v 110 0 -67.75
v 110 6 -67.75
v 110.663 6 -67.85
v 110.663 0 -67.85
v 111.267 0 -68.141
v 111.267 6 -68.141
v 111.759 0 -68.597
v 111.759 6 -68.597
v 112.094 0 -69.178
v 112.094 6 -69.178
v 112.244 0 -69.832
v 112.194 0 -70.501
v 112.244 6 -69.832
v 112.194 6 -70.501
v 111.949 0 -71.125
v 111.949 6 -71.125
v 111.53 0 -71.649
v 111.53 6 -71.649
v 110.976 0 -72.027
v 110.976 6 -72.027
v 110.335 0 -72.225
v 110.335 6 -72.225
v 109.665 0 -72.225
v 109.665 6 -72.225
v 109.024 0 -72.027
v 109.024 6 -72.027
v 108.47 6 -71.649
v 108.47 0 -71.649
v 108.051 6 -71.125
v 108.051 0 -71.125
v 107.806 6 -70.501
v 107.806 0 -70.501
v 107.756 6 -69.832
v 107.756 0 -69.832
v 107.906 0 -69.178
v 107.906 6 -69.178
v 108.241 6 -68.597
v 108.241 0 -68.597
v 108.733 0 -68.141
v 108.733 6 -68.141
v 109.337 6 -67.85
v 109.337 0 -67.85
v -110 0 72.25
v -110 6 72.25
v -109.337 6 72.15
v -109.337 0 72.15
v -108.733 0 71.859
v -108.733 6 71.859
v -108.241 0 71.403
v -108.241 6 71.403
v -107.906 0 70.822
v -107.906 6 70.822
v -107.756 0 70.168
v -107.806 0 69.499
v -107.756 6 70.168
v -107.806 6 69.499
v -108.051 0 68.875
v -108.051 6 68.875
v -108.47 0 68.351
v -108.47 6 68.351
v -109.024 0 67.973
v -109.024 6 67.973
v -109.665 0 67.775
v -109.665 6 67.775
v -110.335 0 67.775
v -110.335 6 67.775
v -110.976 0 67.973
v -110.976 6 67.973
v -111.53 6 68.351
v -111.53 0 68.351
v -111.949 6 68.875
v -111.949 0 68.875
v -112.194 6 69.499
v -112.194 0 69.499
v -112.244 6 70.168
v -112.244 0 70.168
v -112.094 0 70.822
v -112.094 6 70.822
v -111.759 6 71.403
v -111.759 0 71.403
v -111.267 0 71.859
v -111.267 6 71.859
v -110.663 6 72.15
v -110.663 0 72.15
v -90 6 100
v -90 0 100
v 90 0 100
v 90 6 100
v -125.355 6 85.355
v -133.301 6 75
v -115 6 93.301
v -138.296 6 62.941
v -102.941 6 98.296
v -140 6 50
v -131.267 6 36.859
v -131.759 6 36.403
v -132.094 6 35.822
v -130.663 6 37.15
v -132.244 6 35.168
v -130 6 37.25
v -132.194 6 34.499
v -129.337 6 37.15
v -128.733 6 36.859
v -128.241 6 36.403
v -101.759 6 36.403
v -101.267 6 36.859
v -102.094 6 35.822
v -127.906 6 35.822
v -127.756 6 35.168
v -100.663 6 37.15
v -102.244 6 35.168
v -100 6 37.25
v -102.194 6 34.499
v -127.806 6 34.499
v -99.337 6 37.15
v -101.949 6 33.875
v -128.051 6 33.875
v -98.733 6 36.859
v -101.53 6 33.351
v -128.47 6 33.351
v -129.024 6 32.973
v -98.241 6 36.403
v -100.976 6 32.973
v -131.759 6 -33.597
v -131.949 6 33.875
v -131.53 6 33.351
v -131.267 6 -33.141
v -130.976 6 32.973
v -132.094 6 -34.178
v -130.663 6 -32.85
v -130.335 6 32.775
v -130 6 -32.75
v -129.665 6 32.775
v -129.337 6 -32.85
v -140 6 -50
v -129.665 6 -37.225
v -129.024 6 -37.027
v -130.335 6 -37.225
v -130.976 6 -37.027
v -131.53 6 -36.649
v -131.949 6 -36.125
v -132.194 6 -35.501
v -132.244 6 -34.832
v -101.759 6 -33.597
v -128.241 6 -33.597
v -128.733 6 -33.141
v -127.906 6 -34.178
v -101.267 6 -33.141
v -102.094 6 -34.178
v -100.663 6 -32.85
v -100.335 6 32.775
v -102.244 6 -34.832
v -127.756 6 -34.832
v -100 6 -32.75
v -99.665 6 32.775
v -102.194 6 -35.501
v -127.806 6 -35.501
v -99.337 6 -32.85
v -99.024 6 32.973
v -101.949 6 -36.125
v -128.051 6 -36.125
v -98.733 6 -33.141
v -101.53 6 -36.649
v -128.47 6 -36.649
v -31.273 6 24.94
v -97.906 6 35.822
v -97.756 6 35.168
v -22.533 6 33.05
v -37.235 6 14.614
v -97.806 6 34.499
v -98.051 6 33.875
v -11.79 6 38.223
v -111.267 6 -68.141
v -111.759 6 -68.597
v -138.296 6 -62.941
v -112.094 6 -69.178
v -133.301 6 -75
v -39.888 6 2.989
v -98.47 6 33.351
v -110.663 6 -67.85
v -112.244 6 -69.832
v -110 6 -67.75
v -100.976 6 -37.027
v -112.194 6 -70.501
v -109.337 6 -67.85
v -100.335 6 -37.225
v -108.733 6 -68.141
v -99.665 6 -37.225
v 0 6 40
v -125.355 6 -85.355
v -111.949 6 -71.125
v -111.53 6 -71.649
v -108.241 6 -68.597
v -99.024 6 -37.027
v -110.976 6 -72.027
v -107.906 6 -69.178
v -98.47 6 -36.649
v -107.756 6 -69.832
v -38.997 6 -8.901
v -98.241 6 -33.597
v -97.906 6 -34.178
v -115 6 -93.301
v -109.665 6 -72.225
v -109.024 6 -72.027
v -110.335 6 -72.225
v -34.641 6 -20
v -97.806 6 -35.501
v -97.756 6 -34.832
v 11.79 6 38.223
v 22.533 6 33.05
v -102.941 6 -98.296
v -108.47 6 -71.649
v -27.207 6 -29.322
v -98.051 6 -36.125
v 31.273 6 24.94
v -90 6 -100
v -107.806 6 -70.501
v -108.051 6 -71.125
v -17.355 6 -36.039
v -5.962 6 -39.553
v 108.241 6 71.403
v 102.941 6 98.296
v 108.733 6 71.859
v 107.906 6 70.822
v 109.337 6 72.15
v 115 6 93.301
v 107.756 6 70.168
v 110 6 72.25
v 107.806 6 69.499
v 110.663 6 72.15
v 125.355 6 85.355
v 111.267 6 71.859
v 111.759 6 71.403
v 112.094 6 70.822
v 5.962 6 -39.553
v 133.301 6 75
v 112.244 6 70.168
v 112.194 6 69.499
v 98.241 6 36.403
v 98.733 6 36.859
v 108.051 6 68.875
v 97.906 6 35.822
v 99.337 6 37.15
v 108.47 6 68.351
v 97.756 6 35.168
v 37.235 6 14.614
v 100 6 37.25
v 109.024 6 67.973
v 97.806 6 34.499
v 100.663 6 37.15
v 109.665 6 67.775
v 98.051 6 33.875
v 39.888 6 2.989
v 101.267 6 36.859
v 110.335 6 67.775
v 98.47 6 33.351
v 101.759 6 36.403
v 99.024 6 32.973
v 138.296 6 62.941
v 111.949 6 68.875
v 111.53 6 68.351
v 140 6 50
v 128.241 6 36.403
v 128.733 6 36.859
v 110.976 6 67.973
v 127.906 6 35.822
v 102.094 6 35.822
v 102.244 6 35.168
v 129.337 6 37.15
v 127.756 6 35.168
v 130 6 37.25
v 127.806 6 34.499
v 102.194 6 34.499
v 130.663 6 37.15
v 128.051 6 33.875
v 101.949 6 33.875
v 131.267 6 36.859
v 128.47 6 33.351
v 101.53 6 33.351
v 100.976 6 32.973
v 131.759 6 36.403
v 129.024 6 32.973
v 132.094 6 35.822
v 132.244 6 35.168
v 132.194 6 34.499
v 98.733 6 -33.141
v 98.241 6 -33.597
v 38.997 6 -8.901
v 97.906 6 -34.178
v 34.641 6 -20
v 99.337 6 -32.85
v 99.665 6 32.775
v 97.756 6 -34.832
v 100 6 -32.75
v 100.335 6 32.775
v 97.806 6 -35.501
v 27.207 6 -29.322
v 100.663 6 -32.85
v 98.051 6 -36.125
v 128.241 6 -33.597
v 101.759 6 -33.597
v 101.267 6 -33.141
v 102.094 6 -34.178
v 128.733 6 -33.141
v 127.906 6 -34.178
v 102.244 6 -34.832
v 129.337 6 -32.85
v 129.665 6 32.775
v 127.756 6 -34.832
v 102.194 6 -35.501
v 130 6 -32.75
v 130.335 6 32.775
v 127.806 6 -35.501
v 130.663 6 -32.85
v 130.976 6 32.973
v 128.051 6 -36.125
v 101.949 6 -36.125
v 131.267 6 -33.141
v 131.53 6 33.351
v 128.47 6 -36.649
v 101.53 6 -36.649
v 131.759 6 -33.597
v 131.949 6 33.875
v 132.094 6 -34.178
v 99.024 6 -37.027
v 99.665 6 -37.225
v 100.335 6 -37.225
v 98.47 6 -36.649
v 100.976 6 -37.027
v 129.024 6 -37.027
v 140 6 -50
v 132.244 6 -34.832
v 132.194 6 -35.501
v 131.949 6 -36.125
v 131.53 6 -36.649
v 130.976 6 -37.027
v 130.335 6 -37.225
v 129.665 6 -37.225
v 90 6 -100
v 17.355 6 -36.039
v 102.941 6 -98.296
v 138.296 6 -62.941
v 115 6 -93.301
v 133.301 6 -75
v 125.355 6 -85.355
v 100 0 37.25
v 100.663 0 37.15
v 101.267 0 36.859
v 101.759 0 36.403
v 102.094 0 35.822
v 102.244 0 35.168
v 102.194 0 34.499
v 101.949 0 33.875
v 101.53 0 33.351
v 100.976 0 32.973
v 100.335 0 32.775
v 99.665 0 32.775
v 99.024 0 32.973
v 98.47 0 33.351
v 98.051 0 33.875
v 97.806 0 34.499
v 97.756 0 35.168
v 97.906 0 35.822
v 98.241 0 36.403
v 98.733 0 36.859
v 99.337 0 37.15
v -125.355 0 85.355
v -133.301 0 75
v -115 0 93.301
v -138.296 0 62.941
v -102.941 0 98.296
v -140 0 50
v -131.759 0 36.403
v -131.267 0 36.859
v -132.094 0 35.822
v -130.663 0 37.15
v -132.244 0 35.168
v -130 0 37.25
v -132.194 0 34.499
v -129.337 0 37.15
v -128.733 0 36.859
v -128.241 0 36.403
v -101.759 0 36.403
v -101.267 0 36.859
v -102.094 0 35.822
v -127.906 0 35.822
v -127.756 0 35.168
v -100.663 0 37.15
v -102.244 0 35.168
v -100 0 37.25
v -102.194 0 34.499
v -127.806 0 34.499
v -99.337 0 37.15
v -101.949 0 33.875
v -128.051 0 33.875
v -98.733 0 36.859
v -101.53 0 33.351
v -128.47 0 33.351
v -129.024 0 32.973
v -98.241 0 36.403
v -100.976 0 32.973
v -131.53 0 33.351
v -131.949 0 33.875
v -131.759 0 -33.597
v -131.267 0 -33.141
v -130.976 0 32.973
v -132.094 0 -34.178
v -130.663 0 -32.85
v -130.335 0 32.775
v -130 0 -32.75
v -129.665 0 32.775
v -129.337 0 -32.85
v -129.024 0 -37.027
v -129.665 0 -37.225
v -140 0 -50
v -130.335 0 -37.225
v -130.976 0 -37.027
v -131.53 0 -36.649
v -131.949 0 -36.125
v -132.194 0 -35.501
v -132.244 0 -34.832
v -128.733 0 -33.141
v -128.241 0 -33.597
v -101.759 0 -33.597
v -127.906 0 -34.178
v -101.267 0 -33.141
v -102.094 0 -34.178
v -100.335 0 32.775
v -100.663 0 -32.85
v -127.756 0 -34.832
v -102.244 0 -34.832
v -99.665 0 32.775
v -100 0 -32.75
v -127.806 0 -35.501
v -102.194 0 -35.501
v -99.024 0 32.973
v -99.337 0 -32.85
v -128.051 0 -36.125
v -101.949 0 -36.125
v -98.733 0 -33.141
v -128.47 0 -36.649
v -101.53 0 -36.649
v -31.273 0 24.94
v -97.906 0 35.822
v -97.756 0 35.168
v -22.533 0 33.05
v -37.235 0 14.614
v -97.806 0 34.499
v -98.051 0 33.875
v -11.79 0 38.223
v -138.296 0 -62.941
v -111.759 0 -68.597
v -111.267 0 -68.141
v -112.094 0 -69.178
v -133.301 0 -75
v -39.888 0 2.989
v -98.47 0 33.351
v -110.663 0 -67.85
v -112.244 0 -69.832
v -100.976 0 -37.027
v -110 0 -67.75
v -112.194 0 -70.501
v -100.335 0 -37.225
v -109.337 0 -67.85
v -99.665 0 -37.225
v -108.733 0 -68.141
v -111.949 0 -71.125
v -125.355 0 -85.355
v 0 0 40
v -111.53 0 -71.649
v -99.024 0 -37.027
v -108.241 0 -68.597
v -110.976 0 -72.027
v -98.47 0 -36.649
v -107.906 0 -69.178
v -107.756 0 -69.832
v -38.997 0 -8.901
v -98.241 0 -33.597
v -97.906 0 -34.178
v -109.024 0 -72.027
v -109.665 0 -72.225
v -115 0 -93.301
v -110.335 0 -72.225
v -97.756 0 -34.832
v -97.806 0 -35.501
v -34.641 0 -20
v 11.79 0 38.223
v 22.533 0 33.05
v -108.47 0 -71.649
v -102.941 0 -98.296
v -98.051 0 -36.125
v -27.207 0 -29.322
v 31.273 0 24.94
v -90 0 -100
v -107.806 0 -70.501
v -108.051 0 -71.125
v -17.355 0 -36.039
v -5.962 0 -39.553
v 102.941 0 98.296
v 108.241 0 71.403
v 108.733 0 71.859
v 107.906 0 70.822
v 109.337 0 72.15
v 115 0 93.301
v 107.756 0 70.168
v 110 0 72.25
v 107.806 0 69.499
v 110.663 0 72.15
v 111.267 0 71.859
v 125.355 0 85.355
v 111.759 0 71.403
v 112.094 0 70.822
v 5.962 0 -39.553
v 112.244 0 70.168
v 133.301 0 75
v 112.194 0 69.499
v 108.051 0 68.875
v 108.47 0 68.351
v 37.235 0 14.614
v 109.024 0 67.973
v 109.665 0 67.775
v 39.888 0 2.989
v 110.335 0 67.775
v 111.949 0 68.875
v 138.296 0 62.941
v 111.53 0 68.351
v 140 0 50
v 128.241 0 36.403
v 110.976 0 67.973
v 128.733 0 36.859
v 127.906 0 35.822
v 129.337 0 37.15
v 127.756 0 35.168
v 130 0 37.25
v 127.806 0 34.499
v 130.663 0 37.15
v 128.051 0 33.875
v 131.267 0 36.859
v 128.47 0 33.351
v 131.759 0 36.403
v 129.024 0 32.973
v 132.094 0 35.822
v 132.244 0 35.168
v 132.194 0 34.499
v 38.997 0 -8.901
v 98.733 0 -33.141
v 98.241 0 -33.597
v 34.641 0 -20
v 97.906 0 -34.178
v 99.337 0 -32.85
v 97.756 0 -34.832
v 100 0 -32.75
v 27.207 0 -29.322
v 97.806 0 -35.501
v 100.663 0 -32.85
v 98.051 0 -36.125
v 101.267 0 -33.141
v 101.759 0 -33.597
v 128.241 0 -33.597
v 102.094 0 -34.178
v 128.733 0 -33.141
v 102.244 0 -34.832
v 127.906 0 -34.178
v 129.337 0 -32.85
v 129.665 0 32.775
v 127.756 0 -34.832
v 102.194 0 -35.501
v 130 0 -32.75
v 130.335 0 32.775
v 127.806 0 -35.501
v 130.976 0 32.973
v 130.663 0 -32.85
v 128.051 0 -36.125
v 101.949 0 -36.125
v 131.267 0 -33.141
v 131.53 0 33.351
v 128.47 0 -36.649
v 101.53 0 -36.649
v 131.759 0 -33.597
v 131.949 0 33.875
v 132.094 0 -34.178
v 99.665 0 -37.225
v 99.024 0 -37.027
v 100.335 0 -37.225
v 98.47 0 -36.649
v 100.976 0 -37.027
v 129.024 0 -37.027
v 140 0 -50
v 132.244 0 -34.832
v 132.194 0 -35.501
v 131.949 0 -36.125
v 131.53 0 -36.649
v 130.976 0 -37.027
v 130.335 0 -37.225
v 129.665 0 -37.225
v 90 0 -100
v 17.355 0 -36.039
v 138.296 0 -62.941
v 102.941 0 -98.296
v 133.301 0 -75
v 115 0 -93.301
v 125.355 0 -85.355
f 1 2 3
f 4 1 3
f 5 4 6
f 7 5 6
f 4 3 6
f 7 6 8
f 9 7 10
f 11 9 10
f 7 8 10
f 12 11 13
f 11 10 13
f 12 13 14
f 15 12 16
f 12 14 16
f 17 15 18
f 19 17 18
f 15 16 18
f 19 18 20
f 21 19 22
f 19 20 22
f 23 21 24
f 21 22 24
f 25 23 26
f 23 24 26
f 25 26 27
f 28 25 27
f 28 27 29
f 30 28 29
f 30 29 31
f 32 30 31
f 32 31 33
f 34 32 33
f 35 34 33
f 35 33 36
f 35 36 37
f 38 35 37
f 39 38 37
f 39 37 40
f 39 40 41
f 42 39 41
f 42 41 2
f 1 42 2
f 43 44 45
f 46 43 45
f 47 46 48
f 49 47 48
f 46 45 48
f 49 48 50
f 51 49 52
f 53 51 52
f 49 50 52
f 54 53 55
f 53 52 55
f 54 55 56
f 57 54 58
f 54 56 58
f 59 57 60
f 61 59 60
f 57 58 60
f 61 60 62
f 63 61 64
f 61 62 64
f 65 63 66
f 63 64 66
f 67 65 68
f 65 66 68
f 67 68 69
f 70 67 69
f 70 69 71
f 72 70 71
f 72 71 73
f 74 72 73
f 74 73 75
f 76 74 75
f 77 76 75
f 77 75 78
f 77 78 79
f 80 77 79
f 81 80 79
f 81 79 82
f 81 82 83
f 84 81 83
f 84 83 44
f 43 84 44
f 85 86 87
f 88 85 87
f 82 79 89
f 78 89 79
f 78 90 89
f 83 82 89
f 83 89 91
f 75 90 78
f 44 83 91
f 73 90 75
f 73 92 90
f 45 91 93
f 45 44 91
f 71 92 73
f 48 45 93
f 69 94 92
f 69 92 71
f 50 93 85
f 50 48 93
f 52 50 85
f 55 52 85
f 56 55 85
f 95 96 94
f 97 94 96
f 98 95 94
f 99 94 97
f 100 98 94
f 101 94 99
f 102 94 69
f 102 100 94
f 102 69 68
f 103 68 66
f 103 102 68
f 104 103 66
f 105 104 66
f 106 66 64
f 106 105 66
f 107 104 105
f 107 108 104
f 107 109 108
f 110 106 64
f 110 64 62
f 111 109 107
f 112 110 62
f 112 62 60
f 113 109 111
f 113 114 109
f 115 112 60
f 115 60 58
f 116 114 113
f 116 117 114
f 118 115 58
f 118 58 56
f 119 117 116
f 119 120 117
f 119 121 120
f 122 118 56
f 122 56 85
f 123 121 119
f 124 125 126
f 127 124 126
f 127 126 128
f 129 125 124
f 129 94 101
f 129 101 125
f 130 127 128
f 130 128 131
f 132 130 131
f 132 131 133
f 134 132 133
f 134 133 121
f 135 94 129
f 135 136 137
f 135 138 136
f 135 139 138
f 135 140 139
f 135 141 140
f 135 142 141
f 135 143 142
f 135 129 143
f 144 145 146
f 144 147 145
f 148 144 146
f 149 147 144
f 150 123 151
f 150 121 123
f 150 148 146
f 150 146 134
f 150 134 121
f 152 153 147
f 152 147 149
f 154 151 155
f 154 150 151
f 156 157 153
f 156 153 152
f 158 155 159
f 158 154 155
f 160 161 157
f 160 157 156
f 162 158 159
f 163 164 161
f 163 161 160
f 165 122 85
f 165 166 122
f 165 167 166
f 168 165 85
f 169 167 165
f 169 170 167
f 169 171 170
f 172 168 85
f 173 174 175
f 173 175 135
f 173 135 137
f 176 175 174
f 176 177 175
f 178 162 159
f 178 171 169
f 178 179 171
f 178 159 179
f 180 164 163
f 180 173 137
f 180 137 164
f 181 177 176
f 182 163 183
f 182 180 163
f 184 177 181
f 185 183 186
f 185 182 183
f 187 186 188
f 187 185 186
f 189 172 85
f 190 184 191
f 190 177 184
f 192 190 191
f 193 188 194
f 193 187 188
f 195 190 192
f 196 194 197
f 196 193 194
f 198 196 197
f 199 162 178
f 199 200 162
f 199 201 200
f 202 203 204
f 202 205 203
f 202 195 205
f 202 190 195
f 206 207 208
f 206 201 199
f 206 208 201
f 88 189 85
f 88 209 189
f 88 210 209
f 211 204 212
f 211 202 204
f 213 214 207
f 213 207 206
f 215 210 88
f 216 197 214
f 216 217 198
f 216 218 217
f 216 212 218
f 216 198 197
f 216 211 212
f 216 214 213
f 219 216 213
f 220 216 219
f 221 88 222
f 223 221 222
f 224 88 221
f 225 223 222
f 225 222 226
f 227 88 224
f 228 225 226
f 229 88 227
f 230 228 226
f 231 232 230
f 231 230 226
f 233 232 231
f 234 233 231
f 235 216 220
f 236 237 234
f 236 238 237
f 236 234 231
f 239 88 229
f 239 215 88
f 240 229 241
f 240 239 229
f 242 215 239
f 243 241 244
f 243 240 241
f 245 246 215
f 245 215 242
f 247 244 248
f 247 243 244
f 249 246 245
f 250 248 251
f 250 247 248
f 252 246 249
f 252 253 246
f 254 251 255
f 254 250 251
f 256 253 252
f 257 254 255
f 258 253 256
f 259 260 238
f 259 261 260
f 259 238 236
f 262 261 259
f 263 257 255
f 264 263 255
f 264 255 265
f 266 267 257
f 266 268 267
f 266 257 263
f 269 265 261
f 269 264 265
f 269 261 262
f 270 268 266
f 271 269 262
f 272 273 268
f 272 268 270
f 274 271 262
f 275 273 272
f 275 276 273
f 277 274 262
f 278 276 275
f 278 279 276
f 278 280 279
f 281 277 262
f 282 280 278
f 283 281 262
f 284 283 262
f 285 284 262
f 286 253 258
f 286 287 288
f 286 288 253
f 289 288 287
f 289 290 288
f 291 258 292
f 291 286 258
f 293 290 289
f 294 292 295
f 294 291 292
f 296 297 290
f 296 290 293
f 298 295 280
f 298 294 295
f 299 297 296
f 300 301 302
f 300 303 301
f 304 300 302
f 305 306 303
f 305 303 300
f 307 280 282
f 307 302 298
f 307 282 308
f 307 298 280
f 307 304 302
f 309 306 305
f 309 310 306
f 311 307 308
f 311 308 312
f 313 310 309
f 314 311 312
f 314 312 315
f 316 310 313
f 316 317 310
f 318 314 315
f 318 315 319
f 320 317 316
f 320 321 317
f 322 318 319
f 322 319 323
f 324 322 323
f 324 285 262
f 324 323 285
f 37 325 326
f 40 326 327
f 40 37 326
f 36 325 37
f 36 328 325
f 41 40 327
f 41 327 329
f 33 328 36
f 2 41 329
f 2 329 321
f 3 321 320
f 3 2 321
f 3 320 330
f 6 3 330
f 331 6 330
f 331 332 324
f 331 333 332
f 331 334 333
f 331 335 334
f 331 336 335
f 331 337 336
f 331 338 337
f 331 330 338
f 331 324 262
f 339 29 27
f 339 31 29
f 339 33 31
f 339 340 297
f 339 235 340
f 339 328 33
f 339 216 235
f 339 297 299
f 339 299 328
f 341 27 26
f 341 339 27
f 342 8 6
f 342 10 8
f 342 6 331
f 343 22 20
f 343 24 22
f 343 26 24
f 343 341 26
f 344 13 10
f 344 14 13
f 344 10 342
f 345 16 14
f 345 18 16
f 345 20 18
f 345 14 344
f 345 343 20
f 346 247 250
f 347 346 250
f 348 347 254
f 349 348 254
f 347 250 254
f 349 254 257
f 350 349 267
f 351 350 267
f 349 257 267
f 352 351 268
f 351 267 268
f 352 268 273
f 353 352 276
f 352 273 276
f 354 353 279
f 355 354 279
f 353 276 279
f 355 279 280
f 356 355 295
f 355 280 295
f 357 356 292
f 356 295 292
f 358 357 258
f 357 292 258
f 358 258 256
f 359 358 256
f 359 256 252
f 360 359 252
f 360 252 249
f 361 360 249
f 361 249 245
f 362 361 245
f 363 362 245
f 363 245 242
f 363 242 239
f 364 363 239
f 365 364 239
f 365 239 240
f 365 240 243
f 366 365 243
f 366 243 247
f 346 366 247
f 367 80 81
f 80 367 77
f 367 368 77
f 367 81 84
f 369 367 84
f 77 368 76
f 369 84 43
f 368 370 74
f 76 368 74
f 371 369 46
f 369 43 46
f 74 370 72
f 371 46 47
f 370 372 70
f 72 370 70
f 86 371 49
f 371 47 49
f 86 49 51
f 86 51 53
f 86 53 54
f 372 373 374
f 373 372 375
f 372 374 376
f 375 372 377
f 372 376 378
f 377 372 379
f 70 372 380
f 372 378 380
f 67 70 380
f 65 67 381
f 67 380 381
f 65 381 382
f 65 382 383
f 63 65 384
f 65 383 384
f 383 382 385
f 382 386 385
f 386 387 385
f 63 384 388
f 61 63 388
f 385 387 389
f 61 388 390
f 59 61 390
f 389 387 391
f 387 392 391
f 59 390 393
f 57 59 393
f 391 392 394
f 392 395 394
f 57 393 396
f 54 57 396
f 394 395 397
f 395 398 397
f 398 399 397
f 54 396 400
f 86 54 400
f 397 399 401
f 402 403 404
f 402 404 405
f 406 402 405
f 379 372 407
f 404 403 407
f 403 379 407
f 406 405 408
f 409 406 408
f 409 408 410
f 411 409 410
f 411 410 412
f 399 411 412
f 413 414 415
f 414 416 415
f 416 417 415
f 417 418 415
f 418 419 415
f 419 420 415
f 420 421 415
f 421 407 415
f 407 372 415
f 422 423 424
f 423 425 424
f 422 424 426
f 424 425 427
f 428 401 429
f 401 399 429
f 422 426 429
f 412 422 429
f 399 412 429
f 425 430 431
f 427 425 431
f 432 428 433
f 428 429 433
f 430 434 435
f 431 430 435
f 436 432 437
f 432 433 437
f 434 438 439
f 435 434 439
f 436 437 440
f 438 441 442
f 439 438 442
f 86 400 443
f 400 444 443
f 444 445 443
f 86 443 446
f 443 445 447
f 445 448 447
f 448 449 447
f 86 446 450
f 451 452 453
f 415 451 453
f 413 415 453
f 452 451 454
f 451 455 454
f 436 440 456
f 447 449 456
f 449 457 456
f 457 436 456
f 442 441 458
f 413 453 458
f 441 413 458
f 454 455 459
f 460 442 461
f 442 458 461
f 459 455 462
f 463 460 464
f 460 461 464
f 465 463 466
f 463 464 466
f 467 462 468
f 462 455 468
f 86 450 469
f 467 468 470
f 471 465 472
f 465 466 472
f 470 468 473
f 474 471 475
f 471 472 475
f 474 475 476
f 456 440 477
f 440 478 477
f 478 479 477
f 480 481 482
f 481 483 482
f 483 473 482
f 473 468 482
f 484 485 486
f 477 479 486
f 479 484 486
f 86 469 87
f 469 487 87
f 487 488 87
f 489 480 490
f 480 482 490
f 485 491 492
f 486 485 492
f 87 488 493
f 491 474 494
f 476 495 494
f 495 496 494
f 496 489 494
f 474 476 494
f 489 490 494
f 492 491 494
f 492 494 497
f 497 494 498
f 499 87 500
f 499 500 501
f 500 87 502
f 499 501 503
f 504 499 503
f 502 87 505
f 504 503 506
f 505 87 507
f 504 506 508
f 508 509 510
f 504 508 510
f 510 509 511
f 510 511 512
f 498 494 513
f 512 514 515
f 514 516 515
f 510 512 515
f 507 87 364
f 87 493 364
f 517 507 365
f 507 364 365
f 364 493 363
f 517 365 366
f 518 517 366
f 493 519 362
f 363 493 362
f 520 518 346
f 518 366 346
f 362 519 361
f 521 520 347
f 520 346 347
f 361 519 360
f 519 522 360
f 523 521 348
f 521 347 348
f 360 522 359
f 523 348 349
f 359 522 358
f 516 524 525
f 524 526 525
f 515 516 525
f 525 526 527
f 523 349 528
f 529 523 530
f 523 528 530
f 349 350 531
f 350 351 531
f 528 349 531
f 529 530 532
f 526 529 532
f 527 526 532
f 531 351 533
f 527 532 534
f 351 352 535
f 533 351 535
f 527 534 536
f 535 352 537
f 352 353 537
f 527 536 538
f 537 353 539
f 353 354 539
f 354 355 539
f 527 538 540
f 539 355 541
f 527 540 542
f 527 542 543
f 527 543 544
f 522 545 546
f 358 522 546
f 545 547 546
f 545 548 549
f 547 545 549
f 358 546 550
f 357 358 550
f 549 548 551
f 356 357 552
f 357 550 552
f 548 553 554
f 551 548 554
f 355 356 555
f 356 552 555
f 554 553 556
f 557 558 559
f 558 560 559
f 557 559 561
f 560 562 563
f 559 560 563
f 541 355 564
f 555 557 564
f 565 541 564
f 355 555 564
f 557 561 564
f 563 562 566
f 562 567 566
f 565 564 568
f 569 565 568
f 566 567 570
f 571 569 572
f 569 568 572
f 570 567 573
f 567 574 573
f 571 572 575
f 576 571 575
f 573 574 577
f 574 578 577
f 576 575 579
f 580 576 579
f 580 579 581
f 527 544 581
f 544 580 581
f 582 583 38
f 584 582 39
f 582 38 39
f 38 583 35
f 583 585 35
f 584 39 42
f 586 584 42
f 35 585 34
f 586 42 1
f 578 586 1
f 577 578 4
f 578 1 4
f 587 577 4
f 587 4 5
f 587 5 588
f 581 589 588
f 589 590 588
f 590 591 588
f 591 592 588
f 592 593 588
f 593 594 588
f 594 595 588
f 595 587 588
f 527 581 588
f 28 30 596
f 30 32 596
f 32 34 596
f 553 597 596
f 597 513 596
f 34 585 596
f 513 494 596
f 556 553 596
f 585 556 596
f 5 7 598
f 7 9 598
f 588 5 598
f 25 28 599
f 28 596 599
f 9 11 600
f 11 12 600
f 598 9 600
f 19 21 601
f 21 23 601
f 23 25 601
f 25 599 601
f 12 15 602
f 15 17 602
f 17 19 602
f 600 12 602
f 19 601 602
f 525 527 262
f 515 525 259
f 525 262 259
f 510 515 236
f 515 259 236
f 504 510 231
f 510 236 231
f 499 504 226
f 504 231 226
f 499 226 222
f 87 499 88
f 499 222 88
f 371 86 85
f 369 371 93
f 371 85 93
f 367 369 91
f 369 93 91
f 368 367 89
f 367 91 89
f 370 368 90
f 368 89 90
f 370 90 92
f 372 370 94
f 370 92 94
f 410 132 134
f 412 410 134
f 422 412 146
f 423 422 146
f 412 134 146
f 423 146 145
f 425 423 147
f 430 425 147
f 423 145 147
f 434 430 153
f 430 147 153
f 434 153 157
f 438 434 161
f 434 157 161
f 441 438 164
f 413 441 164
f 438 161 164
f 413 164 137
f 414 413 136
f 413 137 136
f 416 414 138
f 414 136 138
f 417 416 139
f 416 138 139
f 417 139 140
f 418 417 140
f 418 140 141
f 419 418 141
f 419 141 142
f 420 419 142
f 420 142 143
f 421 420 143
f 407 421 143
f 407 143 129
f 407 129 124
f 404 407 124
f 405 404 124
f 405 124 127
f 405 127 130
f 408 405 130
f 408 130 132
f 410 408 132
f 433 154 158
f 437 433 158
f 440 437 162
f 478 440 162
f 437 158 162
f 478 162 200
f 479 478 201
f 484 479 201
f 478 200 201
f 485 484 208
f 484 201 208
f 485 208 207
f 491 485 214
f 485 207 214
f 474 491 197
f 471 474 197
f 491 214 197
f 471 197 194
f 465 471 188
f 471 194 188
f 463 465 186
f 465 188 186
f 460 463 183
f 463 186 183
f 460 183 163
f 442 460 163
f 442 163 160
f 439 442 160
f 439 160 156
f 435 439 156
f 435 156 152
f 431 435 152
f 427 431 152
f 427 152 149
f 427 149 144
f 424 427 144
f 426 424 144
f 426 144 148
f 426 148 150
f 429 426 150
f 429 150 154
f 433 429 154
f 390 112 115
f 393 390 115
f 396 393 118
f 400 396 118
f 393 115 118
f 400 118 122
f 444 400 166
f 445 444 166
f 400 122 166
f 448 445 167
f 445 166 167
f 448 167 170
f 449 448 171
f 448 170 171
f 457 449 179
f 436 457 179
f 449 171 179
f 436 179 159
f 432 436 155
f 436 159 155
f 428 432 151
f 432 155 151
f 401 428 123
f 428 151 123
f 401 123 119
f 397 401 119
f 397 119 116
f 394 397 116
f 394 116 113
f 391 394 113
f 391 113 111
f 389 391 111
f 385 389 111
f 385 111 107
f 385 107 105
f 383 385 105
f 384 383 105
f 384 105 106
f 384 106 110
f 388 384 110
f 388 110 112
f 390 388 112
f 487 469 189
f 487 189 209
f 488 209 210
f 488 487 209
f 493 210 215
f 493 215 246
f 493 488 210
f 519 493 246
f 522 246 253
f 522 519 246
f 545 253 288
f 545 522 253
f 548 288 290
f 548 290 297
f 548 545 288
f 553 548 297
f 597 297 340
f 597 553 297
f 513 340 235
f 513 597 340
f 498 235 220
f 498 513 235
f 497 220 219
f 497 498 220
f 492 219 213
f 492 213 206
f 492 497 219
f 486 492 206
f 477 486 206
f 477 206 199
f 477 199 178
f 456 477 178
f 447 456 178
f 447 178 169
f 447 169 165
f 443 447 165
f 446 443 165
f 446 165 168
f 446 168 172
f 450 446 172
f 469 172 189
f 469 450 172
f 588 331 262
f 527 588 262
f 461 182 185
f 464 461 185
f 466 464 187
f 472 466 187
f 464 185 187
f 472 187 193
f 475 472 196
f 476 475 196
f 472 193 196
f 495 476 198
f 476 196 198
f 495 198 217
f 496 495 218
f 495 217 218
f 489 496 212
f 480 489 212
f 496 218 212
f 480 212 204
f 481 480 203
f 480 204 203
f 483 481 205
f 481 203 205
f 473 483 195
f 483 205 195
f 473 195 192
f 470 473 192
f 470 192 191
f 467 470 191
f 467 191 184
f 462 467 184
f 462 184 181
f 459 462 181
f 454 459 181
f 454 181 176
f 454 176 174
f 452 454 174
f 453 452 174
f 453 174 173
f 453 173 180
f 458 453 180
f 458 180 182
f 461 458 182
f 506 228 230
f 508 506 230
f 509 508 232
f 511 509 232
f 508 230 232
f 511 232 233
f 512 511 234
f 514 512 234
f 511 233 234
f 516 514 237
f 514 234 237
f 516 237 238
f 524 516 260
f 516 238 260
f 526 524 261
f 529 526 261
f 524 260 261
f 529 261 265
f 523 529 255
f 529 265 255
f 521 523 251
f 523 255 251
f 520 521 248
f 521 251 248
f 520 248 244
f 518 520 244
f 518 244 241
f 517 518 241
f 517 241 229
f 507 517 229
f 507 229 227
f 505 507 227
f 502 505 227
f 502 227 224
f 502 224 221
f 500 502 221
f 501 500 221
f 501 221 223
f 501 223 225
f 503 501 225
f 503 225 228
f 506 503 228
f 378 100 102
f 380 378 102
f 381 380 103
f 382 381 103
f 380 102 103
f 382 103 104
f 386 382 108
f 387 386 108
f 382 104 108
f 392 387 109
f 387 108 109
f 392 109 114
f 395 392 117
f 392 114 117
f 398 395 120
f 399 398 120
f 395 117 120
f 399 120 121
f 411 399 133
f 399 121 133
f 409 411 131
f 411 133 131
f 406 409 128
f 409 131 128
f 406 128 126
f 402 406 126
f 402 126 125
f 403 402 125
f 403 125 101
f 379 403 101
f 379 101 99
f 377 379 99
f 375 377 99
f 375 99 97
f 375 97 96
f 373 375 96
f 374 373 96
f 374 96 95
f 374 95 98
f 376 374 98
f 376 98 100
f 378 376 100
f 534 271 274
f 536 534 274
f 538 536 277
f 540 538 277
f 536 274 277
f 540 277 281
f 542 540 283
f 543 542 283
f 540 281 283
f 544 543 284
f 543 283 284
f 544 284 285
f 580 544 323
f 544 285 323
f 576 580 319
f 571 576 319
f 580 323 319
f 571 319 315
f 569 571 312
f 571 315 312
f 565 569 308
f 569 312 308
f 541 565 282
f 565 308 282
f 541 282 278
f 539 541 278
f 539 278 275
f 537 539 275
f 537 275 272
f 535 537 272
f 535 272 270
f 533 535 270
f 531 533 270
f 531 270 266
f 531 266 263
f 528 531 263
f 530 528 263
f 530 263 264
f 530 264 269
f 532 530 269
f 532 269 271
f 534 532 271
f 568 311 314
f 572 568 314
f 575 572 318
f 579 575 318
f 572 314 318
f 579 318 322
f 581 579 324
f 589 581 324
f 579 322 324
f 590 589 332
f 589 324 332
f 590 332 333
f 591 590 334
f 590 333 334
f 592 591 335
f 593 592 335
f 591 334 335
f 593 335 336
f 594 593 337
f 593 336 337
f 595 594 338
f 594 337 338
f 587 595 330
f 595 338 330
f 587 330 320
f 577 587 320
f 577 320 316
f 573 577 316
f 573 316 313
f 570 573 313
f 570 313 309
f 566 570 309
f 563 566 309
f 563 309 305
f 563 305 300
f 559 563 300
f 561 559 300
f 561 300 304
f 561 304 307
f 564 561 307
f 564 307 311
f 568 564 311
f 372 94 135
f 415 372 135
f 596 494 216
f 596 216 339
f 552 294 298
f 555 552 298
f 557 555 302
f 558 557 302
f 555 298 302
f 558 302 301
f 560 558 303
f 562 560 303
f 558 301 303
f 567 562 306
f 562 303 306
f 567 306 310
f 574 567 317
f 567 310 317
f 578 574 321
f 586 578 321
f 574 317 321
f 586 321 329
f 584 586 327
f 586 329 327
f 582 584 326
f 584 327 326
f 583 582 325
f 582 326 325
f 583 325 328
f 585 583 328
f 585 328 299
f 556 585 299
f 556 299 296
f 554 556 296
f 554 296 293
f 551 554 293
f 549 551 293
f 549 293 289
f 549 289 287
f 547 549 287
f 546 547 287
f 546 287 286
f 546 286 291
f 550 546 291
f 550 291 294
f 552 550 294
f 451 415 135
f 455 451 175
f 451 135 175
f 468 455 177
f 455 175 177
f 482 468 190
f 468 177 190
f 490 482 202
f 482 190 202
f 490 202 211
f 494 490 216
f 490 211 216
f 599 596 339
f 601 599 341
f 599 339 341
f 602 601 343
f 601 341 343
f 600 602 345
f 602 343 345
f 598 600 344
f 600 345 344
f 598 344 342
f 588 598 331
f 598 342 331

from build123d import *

# Parameters (mm, degrees)
SKETCH_6_W          = 440
SKETCH_6_H          = 200
SKETCH_6_R          = 40
EXTRUDE_2_DEPTH     = 6
SKETCH_7_R          = 2.25
CUT_EXTRUDE_1_DEPTH = 10


with BuildPart() as part:
    # 草图6 → 凸台-拉伸2 (new body)
    with BuildSketch(Plane(origin=(0, 0, 0), x_dir=(1, 0, 0), z_dir=(0, 1, 0))):
        Rectangle(SKETCH_6_W, SKETCH_6_H)
        with Locations(Location((0, 0, 0), (0, 0, 270))):
            Circle(SKETCH_6_R, mode=Mode.SUBTRACT)
    extrude(amount=EXTRUDE_2_DEPTH)

    # 草图7 → 切除-拉伸1 (cut)
    with BuildSketch(Plane(origin=(0, 6, 0), x_dir=(1, 0, 0), z_dir=(0, 1, 0))):
        with BuildLine():
            Line((-140, -50), (-140, 50))
            ThreePointArc((-140, 50), (-125.355339059, 85.355339059), (-90, 100))
            Line((-90, 100), (-220, 100))
            Line((-220, 100), (-220, -100))
            Line((-220, -100), (-90, -100))
            ThreePointArc((-90, -100), (-125.355339059, -85.355339059), (-140, -50))
        make_face()
        with BuildLine():
            Line((220, 100), (90, 100))
            ThreePointArc((90, 100), (125.355339059, 85.355339059), (140, 50))
            Line((140, 50), (140, -50))
            ThreePointArc((140, -50), (125.355339059, -85.355339059), (90, -100))
            Line((90, -100), (220, -100))
            Line((220, -100), (220, 100))
        make_face()
        with Locations(Location((-130, 35, 0), (0, 0, 270))):
            Circle(SKETCH_7_R)
        with Locations(Location((-100, 35, 0), (0, 0, 270))):
            Circle(SKETCH_7_R)
        with Locations(Location((-110, 70, 0), (0, 0, 270))):
            Circle(SKETCH_7_R)
        with Locations(Location((110, 70, 0), (0, 0, 270))):
            Circle(SKETCH_7_R)
        with Locations(Location((100, 35, 0), (0, 0, 270))):
            Circle(SKETCH_7_R)
        with Locations(Location((130, 35, 0), (0, 0, 270))):
            Circle(SKETCH_7_R)
        with Locations(Location((130, -35, 0), (0, 0, 270))):
            Circle(SKETCH_7_R)
        with Locations(Location((100, -35, 0), (0, 0, 270))):
            Circle(SKETCH_7_R)
        with Locations(Location((110, -70, 0), (0, 0, 270))):
            Circle(SKETCH_7_R)
        with Locations(Location((-110, -70, 0), (0, 0, 270))):
            Circle(SKETCH_7_R)
        with Locations(Location((-100, -35, 0), (0, 0, 270))):
            Circle(SKETCH_7_R)
        with Locations(Location((-130, -35, 0), (0, 0, 270))):
            Circle(SKETCH_7_R)
    extrude(amount=-CUT_EXTRUDE_1_DEPTH, mode=Mode.SUBTRACT)


solid = part.part
